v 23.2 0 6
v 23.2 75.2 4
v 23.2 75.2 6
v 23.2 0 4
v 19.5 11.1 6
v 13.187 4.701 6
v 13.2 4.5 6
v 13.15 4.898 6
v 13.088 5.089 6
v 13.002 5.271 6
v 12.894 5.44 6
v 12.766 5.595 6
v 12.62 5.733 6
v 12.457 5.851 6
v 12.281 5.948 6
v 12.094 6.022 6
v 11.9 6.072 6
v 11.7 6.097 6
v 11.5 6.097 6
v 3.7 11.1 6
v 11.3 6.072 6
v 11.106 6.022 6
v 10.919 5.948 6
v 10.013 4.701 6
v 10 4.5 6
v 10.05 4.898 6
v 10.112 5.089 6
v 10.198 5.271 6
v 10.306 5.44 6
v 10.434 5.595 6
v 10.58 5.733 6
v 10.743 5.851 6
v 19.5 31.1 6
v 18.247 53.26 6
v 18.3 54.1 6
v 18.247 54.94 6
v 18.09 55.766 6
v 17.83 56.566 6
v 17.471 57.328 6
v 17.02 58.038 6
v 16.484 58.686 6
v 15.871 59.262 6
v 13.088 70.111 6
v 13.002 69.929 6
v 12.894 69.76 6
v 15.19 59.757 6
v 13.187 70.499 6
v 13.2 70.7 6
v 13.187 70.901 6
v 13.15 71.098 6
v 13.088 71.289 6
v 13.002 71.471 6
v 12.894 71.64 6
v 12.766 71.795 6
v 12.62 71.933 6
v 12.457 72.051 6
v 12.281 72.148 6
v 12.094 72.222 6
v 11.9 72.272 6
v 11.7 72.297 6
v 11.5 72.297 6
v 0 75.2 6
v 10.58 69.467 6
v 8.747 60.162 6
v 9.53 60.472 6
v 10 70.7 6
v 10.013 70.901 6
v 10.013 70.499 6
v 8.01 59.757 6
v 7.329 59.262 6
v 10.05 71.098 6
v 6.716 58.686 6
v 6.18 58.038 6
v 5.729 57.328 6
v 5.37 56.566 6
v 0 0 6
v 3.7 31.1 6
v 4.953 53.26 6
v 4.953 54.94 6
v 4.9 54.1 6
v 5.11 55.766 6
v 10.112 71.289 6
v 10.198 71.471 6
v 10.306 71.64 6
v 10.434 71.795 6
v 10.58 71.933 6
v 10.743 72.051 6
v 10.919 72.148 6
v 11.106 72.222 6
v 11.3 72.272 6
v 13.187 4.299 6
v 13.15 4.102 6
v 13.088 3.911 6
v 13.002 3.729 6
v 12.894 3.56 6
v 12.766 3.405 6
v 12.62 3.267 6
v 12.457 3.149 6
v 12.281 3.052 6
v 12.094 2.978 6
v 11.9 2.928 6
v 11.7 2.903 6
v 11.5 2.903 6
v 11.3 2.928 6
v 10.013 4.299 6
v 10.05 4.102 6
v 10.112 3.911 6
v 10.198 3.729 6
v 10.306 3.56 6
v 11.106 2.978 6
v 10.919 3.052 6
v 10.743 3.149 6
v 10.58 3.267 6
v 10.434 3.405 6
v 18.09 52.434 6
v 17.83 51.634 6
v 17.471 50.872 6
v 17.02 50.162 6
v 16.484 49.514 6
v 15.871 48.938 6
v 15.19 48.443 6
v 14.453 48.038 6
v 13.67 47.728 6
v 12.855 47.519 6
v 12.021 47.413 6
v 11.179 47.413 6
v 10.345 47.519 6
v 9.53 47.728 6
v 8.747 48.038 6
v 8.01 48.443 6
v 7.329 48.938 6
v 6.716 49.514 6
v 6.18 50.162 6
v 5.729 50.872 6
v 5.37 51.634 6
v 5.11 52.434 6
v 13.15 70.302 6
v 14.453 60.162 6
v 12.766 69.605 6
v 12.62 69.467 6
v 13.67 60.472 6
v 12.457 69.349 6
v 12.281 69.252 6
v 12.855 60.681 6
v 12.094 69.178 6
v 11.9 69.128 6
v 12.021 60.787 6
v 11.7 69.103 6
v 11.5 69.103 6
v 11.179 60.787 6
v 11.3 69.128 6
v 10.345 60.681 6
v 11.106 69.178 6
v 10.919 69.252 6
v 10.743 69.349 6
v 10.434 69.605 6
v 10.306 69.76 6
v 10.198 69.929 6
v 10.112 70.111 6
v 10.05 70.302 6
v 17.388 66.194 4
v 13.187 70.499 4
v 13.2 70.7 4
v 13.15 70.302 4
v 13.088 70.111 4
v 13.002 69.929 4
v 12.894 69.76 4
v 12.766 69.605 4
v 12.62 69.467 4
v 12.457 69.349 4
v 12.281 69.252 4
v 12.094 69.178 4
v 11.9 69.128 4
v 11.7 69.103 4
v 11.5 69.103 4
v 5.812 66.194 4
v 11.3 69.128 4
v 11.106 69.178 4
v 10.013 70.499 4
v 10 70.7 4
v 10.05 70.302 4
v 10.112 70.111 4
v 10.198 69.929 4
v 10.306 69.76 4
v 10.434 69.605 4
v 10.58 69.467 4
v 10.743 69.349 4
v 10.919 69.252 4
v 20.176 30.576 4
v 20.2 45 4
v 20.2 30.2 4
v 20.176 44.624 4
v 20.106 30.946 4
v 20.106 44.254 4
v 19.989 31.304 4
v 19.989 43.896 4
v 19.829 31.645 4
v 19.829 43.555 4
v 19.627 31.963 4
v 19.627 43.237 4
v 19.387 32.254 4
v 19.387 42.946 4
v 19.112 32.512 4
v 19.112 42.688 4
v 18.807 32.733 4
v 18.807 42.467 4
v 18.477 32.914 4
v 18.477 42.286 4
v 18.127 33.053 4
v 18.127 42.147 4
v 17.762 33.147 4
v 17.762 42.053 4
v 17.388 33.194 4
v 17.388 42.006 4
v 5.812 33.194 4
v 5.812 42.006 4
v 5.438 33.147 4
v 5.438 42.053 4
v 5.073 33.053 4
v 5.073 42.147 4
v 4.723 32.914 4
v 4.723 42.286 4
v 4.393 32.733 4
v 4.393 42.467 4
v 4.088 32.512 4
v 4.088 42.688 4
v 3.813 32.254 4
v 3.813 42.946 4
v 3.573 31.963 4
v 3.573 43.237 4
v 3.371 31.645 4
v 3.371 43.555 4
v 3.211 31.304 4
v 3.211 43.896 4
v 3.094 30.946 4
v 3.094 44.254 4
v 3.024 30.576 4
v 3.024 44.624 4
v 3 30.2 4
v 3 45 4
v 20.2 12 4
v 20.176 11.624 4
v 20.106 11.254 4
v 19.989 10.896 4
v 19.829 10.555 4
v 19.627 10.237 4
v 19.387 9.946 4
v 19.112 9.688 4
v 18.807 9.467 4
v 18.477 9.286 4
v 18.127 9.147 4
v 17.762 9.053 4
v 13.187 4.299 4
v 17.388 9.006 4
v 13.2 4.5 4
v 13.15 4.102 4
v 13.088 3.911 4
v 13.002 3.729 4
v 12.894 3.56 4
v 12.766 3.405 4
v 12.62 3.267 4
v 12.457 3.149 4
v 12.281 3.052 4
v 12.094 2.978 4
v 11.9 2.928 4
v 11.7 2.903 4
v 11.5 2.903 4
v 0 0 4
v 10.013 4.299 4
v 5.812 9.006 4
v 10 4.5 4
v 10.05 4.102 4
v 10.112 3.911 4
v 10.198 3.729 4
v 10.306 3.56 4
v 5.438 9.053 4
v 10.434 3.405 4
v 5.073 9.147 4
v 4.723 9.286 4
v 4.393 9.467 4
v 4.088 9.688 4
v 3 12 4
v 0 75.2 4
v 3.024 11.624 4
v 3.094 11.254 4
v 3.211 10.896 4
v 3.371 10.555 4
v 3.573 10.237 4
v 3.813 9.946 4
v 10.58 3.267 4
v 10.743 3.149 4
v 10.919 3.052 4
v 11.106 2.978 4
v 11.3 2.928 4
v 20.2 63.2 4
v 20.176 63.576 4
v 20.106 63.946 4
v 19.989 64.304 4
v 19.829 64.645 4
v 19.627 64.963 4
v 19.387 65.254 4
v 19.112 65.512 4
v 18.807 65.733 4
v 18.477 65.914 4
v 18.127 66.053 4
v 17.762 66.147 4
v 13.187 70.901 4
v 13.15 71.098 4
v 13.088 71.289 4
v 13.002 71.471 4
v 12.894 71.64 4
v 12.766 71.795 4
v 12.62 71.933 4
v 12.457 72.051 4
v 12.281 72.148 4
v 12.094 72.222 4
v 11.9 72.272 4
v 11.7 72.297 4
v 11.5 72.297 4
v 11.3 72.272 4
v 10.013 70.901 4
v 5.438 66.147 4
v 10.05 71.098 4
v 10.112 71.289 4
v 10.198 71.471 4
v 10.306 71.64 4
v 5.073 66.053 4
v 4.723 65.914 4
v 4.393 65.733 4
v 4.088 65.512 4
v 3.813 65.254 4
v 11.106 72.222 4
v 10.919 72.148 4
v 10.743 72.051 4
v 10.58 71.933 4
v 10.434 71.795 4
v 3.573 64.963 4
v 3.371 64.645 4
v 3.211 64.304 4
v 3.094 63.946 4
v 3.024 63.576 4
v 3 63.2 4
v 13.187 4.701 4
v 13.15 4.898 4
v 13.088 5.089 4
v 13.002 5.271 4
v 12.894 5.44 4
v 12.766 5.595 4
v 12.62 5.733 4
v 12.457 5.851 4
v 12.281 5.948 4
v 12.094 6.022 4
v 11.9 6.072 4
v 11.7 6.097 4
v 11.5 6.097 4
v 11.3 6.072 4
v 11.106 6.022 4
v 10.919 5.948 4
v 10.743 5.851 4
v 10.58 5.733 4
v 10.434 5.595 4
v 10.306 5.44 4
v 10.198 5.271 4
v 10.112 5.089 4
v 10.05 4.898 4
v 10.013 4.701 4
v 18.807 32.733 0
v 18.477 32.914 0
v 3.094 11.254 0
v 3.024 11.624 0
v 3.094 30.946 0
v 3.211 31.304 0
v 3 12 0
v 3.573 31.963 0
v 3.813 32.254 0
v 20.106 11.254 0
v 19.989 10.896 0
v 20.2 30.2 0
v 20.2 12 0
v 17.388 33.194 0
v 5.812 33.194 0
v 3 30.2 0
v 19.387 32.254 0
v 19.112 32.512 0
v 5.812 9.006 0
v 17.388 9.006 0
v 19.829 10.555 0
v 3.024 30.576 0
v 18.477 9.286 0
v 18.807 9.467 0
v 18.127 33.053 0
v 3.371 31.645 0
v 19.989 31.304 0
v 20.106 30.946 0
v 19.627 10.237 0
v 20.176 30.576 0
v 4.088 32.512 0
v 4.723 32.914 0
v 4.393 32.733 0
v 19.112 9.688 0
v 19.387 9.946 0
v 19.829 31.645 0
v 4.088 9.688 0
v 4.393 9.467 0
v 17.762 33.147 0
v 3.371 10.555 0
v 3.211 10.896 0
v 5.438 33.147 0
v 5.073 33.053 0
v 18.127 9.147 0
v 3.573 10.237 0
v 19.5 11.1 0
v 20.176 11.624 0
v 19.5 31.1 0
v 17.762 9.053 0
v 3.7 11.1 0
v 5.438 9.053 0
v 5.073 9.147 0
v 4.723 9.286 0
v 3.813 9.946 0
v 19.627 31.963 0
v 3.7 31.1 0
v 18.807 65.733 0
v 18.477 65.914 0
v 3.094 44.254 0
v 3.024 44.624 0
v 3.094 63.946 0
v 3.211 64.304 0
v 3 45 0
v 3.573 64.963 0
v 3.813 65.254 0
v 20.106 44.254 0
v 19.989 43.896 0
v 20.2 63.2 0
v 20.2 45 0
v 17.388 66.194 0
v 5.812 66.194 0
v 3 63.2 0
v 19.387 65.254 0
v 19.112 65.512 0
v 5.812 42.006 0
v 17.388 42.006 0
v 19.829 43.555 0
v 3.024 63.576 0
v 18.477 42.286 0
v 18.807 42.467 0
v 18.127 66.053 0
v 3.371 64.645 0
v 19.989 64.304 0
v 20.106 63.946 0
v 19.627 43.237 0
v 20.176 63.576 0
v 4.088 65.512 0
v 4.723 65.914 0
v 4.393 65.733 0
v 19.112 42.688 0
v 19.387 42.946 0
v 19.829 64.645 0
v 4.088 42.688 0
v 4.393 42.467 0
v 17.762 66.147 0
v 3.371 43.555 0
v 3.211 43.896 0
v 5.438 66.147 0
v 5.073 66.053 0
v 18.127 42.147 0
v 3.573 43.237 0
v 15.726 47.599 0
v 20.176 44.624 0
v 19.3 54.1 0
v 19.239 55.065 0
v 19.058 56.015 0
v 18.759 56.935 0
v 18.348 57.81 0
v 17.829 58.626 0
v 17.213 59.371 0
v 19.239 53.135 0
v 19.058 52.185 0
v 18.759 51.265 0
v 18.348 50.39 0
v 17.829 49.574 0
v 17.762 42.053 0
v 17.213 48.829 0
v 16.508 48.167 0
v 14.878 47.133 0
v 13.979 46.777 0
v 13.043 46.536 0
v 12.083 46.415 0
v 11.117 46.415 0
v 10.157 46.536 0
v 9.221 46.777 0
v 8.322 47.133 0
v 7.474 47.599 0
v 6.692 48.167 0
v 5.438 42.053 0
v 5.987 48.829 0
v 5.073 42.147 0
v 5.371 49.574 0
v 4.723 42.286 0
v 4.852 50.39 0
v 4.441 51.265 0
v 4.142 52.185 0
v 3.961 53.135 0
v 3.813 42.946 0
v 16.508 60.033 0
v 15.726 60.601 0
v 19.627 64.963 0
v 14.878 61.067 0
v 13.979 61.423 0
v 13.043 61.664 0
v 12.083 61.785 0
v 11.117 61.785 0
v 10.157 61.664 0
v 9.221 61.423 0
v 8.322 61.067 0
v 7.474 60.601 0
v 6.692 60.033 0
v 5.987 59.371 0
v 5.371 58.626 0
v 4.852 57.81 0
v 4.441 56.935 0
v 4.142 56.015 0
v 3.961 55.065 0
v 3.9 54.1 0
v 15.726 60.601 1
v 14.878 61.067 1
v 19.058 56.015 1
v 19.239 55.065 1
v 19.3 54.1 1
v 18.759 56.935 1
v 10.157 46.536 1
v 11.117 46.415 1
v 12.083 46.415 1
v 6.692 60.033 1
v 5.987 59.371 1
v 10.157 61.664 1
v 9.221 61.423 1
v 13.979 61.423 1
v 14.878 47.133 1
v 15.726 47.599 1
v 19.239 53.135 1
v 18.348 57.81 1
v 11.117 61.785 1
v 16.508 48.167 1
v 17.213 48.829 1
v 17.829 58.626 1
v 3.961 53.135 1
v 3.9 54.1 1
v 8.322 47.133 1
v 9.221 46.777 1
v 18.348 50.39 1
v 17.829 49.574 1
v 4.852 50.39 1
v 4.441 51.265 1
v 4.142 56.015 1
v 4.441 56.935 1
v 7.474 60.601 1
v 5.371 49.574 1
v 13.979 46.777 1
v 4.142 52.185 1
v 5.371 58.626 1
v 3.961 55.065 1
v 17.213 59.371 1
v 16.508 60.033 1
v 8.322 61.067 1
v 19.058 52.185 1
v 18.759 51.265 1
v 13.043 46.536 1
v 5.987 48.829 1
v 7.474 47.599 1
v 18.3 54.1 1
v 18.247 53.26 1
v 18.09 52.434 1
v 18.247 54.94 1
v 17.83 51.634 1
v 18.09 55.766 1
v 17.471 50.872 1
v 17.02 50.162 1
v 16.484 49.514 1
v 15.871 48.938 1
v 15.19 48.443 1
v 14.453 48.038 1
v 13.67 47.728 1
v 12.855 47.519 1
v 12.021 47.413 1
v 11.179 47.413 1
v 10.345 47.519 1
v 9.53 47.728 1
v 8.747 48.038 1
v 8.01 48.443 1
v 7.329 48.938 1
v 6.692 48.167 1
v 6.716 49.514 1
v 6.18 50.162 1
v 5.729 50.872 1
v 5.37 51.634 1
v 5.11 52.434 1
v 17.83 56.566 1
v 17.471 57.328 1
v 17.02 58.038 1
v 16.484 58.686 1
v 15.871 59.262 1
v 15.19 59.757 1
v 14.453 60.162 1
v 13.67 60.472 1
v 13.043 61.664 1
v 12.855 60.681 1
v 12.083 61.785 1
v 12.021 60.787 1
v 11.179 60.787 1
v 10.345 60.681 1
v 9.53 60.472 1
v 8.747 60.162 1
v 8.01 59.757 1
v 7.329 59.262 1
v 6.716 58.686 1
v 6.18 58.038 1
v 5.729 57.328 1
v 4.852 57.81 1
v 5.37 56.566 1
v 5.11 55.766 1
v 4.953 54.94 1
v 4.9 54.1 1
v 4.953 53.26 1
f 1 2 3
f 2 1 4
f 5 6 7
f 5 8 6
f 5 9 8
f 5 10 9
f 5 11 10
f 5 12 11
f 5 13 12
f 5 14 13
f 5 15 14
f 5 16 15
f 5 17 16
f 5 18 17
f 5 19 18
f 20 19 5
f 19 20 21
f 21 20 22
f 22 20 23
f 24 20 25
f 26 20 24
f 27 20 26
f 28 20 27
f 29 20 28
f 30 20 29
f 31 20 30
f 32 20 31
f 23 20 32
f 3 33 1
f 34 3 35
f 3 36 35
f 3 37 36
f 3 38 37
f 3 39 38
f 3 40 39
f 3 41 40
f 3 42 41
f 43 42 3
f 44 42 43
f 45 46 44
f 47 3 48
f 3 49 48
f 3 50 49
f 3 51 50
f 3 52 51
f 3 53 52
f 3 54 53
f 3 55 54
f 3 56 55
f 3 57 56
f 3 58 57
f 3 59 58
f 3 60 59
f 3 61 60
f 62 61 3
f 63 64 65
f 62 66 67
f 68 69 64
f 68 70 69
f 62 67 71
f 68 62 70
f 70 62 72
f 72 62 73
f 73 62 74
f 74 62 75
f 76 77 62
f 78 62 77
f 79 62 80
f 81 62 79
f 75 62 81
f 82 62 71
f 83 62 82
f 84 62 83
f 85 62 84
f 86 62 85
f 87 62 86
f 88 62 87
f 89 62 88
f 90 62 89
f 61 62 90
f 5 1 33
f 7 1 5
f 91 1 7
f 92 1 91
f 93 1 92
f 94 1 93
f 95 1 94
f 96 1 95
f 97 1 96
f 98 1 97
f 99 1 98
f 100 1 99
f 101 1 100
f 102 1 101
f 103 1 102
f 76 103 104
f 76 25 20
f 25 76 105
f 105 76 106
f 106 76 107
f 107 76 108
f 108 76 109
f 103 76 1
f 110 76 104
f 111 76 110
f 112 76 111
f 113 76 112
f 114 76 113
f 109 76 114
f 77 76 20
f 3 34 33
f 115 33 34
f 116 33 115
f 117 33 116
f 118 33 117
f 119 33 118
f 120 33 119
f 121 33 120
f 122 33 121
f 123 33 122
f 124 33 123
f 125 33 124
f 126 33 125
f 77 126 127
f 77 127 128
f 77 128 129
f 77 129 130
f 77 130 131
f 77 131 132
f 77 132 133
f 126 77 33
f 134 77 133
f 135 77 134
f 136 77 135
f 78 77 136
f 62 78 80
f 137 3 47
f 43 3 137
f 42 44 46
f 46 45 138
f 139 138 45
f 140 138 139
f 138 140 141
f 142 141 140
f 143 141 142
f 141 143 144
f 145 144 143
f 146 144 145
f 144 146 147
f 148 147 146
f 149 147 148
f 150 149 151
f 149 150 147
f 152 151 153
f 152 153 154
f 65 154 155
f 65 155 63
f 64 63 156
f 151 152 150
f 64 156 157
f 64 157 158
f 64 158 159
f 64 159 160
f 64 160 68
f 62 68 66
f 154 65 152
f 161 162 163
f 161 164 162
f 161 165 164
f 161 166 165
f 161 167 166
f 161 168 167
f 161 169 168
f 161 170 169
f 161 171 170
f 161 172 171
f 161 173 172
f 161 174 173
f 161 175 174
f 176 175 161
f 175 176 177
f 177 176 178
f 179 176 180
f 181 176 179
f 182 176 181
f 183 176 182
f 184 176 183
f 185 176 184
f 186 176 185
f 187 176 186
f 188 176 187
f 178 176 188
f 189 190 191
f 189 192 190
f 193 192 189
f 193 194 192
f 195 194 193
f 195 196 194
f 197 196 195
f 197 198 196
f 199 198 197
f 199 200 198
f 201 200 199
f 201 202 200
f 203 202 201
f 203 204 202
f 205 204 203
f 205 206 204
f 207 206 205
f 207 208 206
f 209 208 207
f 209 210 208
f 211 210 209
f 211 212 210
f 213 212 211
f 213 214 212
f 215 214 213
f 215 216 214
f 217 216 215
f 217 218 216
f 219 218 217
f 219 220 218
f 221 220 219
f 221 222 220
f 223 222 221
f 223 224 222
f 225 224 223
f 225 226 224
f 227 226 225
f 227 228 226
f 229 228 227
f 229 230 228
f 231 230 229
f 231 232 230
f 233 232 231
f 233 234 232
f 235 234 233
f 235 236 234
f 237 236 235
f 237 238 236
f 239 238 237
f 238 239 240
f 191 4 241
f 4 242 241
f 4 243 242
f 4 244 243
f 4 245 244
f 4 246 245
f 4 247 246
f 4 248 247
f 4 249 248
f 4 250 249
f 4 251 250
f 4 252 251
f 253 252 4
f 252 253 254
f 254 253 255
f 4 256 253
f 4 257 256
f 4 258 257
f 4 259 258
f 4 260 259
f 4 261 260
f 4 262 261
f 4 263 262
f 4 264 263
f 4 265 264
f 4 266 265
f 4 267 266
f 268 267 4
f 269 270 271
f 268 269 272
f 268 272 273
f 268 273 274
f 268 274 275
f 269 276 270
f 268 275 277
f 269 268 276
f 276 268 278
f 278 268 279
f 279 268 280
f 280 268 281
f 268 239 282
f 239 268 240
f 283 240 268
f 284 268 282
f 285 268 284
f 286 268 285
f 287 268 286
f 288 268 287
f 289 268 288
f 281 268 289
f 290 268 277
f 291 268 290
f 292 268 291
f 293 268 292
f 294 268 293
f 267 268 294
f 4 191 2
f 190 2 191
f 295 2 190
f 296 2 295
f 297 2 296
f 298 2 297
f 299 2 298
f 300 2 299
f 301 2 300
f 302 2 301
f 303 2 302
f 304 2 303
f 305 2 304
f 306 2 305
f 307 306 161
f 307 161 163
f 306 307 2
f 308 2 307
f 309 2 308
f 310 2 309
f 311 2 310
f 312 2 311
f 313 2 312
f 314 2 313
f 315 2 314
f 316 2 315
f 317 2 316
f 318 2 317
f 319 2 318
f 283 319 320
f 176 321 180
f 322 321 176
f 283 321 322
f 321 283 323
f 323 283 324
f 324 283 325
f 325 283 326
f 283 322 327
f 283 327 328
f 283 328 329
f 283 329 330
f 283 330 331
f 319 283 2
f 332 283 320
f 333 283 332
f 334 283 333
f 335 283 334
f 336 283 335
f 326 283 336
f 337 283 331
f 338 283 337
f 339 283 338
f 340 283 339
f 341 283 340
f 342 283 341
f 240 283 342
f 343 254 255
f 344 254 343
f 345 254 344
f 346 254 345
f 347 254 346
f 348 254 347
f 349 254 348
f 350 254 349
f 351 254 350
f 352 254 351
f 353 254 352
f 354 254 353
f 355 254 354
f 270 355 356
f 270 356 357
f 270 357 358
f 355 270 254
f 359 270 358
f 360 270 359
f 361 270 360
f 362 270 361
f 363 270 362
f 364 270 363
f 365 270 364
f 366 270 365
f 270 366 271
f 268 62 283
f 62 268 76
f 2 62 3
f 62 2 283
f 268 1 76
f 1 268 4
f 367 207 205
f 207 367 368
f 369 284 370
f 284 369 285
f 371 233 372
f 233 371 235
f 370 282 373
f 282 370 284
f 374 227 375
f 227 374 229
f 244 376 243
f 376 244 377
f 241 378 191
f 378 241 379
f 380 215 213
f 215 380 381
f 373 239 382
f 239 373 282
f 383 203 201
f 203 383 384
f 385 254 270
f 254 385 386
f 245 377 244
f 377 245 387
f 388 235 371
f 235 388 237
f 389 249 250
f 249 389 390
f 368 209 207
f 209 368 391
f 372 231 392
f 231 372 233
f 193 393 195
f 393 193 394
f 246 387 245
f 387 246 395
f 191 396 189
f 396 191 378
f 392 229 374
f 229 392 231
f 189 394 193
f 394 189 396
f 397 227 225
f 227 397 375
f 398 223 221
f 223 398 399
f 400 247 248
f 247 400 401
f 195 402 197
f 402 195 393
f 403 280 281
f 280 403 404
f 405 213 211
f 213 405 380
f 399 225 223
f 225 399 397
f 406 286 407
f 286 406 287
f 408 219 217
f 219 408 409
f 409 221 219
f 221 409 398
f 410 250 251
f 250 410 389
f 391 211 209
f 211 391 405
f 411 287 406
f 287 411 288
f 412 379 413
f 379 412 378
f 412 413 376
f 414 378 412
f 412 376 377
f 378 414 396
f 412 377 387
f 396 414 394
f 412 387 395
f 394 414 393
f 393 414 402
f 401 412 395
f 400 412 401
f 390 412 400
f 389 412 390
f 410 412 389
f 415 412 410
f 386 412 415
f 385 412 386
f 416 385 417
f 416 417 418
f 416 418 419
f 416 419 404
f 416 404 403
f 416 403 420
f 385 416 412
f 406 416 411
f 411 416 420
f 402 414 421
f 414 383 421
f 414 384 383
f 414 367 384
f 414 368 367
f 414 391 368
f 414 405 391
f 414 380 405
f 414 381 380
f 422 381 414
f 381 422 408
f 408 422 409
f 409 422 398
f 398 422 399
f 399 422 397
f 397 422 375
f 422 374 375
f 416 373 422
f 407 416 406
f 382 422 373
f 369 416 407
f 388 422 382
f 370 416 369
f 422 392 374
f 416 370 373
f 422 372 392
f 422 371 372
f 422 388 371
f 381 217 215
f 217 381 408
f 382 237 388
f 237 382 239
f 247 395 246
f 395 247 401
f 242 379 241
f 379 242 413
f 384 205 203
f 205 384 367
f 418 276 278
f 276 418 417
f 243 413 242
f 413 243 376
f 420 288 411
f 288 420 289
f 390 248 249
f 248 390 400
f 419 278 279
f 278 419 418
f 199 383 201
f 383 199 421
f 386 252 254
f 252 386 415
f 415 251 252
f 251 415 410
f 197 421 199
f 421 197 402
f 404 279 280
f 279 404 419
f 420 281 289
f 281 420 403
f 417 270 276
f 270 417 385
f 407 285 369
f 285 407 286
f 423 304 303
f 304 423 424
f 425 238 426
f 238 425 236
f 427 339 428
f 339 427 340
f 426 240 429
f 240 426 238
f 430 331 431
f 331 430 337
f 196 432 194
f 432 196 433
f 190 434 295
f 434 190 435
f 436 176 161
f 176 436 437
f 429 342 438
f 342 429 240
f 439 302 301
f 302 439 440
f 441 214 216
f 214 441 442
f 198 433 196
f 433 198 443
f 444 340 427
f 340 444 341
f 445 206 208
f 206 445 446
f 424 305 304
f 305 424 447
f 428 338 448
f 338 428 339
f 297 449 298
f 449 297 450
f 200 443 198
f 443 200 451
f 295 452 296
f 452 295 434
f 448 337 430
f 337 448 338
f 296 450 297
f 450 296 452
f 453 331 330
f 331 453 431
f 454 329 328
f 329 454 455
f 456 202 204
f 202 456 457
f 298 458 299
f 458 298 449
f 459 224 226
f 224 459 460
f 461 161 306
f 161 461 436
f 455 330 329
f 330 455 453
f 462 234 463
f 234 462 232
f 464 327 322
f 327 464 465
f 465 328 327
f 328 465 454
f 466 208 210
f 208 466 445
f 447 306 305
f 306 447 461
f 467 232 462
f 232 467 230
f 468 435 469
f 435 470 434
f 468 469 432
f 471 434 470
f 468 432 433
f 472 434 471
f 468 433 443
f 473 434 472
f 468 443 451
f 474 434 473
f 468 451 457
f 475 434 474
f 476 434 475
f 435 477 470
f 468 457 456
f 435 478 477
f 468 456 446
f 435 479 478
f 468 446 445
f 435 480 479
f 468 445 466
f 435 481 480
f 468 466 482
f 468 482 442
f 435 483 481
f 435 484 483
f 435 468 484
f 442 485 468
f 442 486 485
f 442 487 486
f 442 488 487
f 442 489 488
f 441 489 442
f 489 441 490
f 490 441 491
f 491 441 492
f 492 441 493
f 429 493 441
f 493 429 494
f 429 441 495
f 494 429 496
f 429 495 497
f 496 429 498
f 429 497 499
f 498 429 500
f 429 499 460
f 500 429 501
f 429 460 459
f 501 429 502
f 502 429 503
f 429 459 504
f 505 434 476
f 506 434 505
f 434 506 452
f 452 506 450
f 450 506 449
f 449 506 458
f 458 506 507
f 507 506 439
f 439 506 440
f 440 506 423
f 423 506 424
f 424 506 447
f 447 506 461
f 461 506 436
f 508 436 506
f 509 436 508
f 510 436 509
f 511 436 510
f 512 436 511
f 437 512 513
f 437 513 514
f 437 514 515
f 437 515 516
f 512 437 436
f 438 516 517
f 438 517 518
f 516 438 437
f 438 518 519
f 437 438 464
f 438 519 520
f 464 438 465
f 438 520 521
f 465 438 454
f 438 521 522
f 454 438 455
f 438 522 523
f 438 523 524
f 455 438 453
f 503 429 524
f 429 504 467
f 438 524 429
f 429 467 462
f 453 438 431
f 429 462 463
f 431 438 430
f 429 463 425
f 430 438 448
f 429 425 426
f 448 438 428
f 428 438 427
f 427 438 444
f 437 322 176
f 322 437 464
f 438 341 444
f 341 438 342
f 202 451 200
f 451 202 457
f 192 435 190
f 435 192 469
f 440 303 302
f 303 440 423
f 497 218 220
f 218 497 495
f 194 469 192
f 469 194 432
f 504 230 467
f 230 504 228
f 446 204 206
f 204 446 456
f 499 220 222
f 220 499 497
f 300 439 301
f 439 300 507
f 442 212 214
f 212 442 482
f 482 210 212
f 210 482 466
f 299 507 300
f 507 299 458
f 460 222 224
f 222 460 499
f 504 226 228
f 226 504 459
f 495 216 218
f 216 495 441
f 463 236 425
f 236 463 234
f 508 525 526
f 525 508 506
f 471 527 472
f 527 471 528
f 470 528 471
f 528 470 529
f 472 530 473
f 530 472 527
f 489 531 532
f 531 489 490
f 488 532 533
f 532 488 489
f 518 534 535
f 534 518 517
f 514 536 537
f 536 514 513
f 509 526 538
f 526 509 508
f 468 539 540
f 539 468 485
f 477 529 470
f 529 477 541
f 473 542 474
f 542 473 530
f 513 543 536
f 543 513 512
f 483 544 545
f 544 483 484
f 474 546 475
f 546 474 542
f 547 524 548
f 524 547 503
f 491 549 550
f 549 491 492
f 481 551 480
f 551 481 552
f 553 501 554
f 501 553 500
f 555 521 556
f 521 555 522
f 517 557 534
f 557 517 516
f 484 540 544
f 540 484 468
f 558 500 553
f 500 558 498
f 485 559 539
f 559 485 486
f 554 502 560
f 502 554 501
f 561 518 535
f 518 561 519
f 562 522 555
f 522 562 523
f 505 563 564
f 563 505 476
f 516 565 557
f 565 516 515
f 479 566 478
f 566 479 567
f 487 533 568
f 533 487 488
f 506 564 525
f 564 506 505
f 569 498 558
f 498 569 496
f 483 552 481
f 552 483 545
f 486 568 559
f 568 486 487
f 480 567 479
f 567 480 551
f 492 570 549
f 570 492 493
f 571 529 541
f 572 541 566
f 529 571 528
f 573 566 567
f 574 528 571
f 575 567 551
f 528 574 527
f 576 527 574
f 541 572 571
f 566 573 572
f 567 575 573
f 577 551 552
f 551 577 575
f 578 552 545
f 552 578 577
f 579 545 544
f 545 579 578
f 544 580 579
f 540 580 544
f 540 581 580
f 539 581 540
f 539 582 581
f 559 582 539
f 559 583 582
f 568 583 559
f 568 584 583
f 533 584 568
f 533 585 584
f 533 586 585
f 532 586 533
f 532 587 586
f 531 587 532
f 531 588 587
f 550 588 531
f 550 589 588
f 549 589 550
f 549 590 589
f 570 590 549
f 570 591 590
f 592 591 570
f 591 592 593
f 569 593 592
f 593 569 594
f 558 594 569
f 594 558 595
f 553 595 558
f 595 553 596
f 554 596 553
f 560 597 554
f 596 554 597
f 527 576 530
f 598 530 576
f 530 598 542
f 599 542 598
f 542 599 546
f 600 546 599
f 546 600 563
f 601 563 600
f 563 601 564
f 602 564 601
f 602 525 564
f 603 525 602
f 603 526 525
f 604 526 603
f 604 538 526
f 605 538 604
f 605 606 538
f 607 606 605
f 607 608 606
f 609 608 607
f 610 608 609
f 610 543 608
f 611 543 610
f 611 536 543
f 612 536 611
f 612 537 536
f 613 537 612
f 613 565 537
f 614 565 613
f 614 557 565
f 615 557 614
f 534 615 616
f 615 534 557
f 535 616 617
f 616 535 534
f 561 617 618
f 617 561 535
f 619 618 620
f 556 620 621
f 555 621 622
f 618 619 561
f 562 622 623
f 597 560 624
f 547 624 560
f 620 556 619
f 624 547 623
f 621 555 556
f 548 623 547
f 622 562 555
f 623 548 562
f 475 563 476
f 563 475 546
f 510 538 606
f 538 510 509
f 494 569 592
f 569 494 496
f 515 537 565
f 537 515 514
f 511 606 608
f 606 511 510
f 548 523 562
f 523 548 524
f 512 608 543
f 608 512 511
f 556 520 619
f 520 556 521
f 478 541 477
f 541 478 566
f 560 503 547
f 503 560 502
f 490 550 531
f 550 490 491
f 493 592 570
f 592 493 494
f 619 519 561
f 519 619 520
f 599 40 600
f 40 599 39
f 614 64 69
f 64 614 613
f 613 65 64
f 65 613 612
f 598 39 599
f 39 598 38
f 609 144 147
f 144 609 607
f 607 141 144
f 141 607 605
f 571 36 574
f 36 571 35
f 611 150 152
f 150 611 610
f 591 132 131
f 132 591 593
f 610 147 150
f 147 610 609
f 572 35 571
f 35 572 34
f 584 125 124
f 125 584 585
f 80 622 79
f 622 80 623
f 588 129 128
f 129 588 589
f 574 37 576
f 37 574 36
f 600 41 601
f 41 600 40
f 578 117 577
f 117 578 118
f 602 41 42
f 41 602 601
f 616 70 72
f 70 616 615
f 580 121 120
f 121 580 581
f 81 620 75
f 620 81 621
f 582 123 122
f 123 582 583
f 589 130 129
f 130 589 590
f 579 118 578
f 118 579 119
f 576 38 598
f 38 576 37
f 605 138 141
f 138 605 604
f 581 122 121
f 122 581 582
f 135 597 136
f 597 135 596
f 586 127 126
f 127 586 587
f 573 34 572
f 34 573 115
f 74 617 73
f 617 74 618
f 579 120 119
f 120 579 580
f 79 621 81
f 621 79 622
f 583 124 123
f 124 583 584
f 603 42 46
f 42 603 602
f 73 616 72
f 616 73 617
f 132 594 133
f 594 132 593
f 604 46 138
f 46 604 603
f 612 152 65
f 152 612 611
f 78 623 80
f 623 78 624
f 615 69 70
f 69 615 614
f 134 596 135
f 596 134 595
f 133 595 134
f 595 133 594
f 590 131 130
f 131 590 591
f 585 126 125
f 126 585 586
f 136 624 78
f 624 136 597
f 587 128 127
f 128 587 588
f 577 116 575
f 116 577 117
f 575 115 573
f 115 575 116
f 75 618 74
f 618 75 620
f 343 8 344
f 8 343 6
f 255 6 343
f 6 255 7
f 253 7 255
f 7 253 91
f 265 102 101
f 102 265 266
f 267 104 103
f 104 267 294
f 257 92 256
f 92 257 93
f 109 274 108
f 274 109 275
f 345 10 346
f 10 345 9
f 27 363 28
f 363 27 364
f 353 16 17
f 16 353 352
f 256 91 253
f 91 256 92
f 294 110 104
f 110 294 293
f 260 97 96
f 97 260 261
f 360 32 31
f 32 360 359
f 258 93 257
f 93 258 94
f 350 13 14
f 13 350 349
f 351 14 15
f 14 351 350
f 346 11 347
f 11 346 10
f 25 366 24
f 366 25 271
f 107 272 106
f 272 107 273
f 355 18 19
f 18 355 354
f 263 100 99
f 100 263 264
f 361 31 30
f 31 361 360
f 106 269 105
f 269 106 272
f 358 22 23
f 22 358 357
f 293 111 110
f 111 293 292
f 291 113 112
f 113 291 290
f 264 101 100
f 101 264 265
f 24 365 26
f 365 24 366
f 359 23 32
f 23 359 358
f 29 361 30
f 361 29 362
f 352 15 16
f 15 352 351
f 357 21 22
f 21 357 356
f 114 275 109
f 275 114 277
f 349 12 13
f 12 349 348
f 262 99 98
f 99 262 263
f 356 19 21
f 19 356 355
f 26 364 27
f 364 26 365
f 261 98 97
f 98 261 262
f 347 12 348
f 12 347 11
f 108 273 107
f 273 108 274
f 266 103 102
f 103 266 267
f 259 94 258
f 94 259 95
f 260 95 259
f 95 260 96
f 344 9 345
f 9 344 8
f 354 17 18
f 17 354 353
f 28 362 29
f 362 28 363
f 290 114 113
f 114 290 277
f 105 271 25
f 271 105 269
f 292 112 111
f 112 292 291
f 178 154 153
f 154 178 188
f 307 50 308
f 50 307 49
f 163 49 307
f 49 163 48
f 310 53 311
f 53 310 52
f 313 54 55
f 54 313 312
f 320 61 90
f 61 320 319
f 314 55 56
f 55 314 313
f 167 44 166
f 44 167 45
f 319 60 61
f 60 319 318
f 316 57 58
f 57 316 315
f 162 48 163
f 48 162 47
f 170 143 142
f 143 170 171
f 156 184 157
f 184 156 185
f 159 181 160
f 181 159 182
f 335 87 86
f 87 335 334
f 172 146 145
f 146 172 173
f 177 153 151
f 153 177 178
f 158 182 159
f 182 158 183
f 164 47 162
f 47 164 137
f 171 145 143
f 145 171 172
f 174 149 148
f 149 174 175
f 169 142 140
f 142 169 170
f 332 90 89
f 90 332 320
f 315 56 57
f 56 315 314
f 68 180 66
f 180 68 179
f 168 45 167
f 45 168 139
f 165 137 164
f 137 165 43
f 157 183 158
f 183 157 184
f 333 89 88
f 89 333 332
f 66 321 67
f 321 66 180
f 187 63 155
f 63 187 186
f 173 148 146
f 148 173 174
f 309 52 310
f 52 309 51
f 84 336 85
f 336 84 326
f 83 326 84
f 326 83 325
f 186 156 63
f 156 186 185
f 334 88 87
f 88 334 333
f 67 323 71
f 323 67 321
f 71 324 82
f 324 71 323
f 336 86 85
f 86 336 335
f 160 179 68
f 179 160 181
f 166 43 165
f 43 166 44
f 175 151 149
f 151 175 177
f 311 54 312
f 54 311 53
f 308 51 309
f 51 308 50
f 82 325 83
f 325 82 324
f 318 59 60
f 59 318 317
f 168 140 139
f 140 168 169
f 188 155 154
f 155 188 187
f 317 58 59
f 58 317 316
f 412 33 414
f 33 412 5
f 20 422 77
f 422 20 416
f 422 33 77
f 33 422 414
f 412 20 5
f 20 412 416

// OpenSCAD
$fn=50;
openingWidth = 17.2;
openingHeight = 24.2;
cornerRadius = 3.0;
openingDepth = 4.0;
separation = 8.8;

baseBufferVert = 9.0;
baseBufferHorz = 3.0;
baseDepth = 2.0;
baseWidth = baseBufferHorz + openingWidth + baseBufferHorz;
baseHeight = baseBufferVert + openingHeight + separation + openingHeight + baseBufferVert;

// Screw holes
screwHoleDiameter = 3.2;
screwHoleRadius = screwHoleDiameter/2;
screwHoleX = baseWidth/2;
screwHoleOneY = baseBufferVert/2;
screwHoleTwoY = baseHeight - baseBufferVert/2;

// Openings that the plugs go through
firstOpeningY = baseBufferVert;
secondOpeningY = baseBufferVert + openingHeight + separation;

// Hole one - Ethernet
holeOneWidth = 15.8;
holeOneHeight = 20.0;
holeOneX = baseBufferHorz + ( openingWidth - holeOneWidth ) /2;
holeOneY = baseBufferVert + ( openingHeight - holeOneHeight ) / 2;

holeOneX = baseBufferHorz + ( openingWidth - holeOneWidth ) /2;
holeOneY = baseBufferVert + ( openingHeight - holeOneHeight ) / 2;

// Hole two - Power
holeTwoWidth = 15.8;
holeTwoHeight = 20.0;
holeTwoX = baseBufferHorz + ( openingWidth - holeTwoWidth ) /2;
holeTwoY = secondOpeningY + ( openingHeight - holeTwoHeight ) / 2;

powerBoxWidth = 16.4;
powerBoxHeight = openingHeight - 2.0;
powerPortDiameter = 12.6 + 0.8;
powerPortRadius = powerPortDiameter / 2;
powerPortDepth = 4.0;
powerPortInset = 2.0;
powerPortInsetBorder = 1.0;

powerBoxX = baseBufferHorz + ( openingWidth - powerBoxWidth ) /2;
powerBoxY = secondOpeningY + ( openingHeight - powerBoxHeight ) / 2;

module plug(w, h, d, cr){
    linear_extrude(d)
    hull() {
        translate([cr, cr, 0])
        circle(cr);

        translate([w-cr, h-cr, 0])
        circle(cr);
        
        translate([w-cr, cr, 0])
        circle(cr);
        
        translate([cr,  h-cr, 0])
        circle(cr);
    }
}

difference() {
    union() {
        translate([0, 0, openingDepth])
        cube( [baseWidth, baseHeight, baseDepth] );

        translate( [ baseBufferHorz, firstOpeningY, 0] ) {
            plug( openingWidth, openingHeight, openingDepth, cornerRadius );
        }

        translate( [ baseBufferHorz, secondOpeningY, 0] ) {
            plug( openingWidth, openingHeight, openingDepth, cornerRadius );
        }
    }
    
    // Screw holes
    translate( [screwHoleX, screwHoleOneY, -1] )
    cylinder( h=20, r=screwHoleRadius, center=true );

    translate( [screwHoleX, screwHoleTwoY, -1] )
    cylinder( h=20, r=screwHoleRadius, center=true );
    
    // Hole one
    translate( [holeOneX, holeOneY, -10 ] )
    cube( [holeOneWidth, holeOneHeight, 50] );

    // Hole two
    translate( [powerBoxX, powerBoxY, 0 ] ) {
        union() {
            translate([ powerBoxWidth/2, powerBoxHeight/2, 0]) {
                translate( [0, 0, 0 ])
                cylinder( h=powerPortInset, r=powerPortRadius+powerPortInsetBorder, center=true );
                
                translate( [0, 0, powerPortInset ])
                cylinder( h=powerPortDepth+5, r=powerPortRadius, center=true );
            }
        }
    }

}
